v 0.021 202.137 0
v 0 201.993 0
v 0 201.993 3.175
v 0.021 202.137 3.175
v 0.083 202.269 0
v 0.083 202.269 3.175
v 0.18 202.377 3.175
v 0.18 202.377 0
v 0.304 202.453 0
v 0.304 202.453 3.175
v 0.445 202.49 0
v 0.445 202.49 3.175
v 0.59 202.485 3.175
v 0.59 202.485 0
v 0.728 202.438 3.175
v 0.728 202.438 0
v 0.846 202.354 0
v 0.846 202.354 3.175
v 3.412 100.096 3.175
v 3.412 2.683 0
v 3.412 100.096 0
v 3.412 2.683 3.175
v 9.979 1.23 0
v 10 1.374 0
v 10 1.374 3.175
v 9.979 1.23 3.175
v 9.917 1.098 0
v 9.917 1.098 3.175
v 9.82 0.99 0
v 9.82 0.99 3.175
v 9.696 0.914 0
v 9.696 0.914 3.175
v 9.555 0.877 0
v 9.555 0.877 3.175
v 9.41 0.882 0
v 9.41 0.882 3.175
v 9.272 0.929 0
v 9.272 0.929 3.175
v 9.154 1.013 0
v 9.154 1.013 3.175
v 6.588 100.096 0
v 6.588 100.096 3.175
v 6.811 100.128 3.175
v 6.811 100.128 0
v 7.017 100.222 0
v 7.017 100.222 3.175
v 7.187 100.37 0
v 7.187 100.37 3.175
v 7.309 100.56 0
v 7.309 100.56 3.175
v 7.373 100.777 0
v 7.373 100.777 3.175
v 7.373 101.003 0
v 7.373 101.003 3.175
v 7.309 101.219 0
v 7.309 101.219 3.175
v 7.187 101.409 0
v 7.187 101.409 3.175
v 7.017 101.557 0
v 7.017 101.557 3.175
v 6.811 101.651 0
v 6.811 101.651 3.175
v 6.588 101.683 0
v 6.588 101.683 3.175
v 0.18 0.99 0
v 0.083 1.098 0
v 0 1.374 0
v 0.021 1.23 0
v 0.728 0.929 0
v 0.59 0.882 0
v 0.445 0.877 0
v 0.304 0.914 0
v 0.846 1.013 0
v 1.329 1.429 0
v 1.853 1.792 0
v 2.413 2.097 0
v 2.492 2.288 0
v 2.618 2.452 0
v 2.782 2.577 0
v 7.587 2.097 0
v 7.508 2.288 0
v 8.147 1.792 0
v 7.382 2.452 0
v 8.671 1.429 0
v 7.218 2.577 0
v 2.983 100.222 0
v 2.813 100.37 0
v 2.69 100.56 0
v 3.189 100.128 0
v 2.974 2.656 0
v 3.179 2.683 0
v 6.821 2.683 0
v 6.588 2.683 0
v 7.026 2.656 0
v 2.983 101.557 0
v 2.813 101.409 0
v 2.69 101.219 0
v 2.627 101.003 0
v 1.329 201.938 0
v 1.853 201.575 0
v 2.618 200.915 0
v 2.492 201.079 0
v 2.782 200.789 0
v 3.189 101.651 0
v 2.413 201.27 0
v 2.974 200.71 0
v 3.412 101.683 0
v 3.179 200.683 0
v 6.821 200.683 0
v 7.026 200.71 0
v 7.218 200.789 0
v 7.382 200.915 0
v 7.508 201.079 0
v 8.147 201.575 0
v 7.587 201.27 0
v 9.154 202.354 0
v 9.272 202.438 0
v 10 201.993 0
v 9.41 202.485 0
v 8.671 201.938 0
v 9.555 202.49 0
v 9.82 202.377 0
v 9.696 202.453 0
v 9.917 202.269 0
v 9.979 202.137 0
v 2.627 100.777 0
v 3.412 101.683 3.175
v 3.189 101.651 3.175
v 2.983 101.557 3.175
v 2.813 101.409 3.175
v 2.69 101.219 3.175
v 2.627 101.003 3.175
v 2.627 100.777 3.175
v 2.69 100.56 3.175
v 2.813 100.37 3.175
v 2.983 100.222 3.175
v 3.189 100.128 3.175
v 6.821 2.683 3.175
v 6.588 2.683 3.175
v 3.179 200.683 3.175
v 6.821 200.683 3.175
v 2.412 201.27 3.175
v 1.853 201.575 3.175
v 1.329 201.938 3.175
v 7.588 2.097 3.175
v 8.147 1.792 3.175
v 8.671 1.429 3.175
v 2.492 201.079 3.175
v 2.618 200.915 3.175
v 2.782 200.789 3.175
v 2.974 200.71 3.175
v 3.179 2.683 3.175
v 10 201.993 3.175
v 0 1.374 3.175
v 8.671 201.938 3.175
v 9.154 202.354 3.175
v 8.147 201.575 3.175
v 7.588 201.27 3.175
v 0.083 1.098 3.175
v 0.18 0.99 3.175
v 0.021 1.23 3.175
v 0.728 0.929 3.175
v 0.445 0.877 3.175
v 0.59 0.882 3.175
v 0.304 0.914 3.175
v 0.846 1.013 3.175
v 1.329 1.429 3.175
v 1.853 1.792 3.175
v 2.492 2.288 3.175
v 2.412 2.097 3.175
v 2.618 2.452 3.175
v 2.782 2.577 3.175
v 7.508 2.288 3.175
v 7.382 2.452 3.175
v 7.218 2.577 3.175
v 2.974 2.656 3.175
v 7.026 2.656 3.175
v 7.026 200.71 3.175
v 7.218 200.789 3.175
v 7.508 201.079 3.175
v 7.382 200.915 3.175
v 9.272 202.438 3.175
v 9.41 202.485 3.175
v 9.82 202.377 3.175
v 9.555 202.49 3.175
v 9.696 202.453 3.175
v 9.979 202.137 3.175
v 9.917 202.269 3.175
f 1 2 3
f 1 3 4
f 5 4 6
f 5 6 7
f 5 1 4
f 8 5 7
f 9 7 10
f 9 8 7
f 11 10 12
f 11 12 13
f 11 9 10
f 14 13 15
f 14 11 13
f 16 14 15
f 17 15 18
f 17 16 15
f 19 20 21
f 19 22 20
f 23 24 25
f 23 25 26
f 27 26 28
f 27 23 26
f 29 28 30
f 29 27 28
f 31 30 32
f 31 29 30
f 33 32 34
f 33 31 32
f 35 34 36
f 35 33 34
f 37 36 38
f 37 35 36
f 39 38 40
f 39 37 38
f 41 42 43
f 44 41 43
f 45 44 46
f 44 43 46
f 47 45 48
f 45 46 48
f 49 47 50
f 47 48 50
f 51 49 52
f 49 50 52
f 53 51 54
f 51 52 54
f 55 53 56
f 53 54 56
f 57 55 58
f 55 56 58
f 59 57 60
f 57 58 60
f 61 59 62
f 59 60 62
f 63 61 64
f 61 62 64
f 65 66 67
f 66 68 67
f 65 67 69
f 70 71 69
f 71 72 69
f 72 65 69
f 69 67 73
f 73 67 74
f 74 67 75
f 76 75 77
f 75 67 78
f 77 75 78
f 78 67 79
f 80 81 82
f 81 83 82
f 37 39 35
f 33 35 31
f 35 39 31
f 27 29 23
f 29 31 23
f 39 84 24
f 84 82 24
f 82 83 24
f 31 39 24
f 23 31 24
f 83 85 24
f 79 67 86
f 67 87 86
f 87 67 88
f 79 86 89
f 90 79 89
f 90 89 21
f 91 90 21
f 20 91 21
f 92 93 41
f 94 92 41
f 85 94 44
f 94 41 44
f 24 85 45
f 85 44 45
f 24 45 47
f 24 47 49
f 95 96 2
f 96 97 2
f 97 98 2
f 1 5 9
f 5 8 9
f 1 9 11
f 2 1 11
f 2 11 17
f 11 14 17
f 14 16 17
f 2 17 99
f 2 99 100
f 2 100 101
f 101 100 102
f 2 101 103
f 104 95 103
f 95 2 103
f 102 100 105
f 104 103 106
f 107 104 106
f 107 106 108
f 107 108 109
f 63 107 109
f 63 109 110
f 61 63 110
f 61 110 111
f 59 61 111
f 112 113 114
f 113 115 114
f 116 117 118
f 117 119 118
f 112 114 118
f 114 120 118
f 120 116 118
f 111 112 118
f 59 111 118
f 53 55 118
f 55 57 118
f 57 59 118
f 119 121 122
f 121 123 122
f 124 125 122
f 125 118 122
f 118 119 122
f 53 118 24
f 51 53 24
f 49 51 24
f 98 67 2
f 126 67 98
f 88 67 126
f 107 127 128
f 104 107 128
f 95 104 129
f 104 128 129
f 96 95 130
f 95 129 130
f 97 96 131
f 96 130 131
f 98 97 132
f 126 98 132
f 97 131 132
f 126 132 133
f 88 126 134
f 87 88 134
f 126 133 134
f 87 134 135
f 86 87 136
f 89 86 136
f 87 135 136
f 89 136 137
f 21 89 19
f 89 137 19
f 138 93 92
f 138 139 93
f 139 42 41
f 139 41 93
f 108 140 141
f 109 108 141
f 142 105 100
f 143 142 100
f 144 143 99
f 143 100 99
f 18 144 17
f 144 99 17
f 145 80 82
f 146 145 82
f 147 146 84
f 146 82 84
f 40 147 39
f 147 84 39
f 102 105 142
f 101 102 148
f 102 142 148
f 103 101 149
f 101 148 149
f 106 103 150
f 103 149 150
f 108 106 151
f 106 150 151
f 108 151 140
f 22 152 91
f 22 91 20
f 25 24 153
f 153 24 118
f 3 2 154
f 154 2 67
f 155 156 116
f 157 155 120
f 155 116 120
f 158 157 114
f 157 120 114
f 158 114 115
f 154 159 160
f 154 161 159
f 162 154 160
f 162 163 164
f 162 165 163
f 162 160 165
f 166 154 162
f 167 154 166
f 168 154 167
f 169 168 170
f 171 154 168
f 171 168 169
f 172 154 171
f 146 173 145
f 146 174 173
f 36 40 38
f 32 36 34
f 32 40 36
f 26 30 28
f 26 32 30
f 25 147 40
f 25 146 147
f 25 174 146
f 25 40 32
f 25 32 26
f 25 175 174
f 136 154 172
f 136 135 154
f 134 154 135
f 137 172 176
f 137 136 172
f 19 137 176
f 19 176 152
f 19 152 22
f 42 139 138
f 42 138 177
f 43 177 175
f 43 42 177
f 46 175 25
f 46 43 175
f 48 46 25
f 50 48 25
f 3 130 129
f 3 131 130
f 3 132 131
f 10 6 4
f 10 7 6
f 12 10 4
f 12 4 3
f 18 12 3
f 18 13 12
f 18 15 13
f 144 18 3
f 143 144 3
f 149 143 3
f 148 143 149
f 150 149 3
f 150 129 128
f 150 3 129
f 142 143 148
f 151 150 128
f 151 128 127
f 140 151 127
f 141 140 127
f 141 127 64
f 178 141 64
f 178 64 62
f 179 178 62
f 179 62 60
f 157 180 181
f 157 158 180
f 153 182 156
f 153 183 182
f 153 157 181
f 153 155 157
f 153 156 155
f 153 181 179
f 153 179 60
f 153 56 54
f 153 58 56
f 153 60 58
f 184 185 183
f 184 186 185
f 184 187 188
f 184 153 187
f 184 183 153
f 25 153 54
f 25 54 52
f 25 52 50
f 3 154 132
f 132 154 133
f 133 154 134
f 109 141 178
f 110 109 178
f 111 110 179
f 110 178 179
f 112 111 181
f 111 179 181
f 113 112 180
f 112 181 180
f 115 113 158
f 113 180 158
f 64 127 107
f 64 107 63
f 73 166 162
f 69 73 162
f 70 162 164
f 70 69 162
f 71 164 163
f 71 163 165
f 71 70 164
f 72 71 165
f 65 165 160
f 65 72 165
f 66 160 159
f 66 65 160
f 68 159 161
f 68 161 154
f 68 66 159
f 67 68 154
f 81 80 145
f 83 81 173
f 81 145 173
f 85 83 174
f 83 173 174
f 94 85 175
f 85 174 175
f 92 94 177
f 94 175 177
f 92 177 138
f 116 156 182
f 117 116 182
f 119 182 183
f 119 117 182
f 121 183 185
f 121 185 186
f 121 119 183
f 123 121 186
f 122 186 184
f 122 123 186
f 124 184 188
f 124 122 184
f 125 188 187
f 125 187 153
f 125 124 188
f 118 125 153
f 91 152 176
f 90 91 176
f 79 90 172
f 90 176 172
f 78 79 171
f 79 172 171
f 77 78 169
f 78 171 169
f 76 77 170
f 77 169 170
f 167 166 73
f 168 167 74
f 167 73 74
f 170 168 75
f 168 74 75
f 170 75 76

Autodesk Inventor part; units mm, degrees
ref_plane "YZ Plane" through (0, 0, 0) normal (1, 0, 0) x (0, 1, 0)
ref_plane "XZ Plane" through (0, 0, 0) normal (0, 1, 0) x (-1, 0, 0)
ref_plane "XY Plane" through (0, 0, 0) normal (0, 0, 1) x (1, 0, 0)
sketch "Sketch1" plane through (0, 0, 0) normal (0, 0, 1) x (1, 0, 0)
  arc A0 (10, 0) -> (0, 0) centre (5, -3.3166) ccw
  arc A1 (0, 203.3668) -> (10, 203.3668) centre (5, 206.6834) ccw
  line L0 (0, 203.3668) -> (0, 0)
  line L1 (10, 0) -> (10, 203.3668)
  dimension "d0" = 10
  dimension "d1" = 6
  dimension "d2" = 210
extrude "Extrusion1" add sketch "Sketch1" along normal blind 3.175
sketch "Sketch2" plane through (0, 0, 3.175) normal (0, 0, 1) x (1, 0, 0)
  arc A0 (10, 0) -> (0, 0) centre (5, -3.3166) ccw projected
  arc A1 (0, 203.3668) -> (10, 203.3668) centre (5, 206.6834) ccw projected
  line L0 (0, 203.3668) -> (0, 0) projected
  line L1 (2.4125, 2.0968) -> (2.4125, 2.6834)
  line L2 (2.4125, 2.6834) -> (3.4125, 2.6834)
  line L3 (3.4125, 2.6834) -> (3.4125, 100.0959)
  line L4 (3.4125, 101.6834) -> (6.5875, 101.6834)
  line L5 (6.5875, 100.0959) -> (6.5875, 2.6834)
  line L6 (6.5875, 2.6834) -> (7.5875, 2.6834)
  line L7 (7.5875, 2.6834) -> (7.5875, 2.0968)
  arc A2 (3.4125, 101.6834) -> (3.4125, 100.0959) centre (3.4125, 100.8896) ccw
  arc A3 (6.5875, 100.0959) -> (6.5875, 101.6834) centre (6.5875, 100.8896) ccw
  line L8 (10, 0) -> (10, 203.3668) projected
  line L9 (2.4125, 201.27) -> (2.4125, 200.6834)
  line L10 (2.4125, 200.6834) -> (7.5875, 200.6834)
  line L11 (7.5875, 200.6834) -> (7.5875, 201.27)
  point P0 (5, 101.6834)
  dimension "d6" = 3.175
  dimension "d7" = 1
  dimension "d8" = 210
  dimension "d9" = 105
  dimension "d10" = 0.7937
extrude "Extrusion2" cut sketch "Sketch2" against normal up to next contours A0 L1 L2 L3 A2 L4 A3 L5 L6 L7 | L11 L10 A1 | L10 L9 A1
fillet "Fillet1" radius 0.7937 4 edges at (2.4125, 2.6834, 1.5875) (7.5875, 2.6834, 1.5875) (2.4125, 200.6834, 1.5875) (7.5875, 200.6834, 1.5875)
fillet "Fillet1" radius 0.5 4 edges at (0, 0, 1.5875) (10, 0, 1.5875) (10, 203.3668, 1.5875) (0, 203.3668, 1.5875)
equation "\"d3\" = THICKA"
equation "\"d6\" = THICKA"
equation "\"d9\" = 0.5 * d8"
equation "\"d11\" = THICKA"
equation "\"THICKA\" = 3.175"
equation "\"THICKB\" = 6.731"
equation "\"THICKC\" = 12.7"
equation "\"MAGDIA\" = 9.5"
equation "\"BALLDIA\" = 12"
properties part number "Effector_Arm_Ball"
